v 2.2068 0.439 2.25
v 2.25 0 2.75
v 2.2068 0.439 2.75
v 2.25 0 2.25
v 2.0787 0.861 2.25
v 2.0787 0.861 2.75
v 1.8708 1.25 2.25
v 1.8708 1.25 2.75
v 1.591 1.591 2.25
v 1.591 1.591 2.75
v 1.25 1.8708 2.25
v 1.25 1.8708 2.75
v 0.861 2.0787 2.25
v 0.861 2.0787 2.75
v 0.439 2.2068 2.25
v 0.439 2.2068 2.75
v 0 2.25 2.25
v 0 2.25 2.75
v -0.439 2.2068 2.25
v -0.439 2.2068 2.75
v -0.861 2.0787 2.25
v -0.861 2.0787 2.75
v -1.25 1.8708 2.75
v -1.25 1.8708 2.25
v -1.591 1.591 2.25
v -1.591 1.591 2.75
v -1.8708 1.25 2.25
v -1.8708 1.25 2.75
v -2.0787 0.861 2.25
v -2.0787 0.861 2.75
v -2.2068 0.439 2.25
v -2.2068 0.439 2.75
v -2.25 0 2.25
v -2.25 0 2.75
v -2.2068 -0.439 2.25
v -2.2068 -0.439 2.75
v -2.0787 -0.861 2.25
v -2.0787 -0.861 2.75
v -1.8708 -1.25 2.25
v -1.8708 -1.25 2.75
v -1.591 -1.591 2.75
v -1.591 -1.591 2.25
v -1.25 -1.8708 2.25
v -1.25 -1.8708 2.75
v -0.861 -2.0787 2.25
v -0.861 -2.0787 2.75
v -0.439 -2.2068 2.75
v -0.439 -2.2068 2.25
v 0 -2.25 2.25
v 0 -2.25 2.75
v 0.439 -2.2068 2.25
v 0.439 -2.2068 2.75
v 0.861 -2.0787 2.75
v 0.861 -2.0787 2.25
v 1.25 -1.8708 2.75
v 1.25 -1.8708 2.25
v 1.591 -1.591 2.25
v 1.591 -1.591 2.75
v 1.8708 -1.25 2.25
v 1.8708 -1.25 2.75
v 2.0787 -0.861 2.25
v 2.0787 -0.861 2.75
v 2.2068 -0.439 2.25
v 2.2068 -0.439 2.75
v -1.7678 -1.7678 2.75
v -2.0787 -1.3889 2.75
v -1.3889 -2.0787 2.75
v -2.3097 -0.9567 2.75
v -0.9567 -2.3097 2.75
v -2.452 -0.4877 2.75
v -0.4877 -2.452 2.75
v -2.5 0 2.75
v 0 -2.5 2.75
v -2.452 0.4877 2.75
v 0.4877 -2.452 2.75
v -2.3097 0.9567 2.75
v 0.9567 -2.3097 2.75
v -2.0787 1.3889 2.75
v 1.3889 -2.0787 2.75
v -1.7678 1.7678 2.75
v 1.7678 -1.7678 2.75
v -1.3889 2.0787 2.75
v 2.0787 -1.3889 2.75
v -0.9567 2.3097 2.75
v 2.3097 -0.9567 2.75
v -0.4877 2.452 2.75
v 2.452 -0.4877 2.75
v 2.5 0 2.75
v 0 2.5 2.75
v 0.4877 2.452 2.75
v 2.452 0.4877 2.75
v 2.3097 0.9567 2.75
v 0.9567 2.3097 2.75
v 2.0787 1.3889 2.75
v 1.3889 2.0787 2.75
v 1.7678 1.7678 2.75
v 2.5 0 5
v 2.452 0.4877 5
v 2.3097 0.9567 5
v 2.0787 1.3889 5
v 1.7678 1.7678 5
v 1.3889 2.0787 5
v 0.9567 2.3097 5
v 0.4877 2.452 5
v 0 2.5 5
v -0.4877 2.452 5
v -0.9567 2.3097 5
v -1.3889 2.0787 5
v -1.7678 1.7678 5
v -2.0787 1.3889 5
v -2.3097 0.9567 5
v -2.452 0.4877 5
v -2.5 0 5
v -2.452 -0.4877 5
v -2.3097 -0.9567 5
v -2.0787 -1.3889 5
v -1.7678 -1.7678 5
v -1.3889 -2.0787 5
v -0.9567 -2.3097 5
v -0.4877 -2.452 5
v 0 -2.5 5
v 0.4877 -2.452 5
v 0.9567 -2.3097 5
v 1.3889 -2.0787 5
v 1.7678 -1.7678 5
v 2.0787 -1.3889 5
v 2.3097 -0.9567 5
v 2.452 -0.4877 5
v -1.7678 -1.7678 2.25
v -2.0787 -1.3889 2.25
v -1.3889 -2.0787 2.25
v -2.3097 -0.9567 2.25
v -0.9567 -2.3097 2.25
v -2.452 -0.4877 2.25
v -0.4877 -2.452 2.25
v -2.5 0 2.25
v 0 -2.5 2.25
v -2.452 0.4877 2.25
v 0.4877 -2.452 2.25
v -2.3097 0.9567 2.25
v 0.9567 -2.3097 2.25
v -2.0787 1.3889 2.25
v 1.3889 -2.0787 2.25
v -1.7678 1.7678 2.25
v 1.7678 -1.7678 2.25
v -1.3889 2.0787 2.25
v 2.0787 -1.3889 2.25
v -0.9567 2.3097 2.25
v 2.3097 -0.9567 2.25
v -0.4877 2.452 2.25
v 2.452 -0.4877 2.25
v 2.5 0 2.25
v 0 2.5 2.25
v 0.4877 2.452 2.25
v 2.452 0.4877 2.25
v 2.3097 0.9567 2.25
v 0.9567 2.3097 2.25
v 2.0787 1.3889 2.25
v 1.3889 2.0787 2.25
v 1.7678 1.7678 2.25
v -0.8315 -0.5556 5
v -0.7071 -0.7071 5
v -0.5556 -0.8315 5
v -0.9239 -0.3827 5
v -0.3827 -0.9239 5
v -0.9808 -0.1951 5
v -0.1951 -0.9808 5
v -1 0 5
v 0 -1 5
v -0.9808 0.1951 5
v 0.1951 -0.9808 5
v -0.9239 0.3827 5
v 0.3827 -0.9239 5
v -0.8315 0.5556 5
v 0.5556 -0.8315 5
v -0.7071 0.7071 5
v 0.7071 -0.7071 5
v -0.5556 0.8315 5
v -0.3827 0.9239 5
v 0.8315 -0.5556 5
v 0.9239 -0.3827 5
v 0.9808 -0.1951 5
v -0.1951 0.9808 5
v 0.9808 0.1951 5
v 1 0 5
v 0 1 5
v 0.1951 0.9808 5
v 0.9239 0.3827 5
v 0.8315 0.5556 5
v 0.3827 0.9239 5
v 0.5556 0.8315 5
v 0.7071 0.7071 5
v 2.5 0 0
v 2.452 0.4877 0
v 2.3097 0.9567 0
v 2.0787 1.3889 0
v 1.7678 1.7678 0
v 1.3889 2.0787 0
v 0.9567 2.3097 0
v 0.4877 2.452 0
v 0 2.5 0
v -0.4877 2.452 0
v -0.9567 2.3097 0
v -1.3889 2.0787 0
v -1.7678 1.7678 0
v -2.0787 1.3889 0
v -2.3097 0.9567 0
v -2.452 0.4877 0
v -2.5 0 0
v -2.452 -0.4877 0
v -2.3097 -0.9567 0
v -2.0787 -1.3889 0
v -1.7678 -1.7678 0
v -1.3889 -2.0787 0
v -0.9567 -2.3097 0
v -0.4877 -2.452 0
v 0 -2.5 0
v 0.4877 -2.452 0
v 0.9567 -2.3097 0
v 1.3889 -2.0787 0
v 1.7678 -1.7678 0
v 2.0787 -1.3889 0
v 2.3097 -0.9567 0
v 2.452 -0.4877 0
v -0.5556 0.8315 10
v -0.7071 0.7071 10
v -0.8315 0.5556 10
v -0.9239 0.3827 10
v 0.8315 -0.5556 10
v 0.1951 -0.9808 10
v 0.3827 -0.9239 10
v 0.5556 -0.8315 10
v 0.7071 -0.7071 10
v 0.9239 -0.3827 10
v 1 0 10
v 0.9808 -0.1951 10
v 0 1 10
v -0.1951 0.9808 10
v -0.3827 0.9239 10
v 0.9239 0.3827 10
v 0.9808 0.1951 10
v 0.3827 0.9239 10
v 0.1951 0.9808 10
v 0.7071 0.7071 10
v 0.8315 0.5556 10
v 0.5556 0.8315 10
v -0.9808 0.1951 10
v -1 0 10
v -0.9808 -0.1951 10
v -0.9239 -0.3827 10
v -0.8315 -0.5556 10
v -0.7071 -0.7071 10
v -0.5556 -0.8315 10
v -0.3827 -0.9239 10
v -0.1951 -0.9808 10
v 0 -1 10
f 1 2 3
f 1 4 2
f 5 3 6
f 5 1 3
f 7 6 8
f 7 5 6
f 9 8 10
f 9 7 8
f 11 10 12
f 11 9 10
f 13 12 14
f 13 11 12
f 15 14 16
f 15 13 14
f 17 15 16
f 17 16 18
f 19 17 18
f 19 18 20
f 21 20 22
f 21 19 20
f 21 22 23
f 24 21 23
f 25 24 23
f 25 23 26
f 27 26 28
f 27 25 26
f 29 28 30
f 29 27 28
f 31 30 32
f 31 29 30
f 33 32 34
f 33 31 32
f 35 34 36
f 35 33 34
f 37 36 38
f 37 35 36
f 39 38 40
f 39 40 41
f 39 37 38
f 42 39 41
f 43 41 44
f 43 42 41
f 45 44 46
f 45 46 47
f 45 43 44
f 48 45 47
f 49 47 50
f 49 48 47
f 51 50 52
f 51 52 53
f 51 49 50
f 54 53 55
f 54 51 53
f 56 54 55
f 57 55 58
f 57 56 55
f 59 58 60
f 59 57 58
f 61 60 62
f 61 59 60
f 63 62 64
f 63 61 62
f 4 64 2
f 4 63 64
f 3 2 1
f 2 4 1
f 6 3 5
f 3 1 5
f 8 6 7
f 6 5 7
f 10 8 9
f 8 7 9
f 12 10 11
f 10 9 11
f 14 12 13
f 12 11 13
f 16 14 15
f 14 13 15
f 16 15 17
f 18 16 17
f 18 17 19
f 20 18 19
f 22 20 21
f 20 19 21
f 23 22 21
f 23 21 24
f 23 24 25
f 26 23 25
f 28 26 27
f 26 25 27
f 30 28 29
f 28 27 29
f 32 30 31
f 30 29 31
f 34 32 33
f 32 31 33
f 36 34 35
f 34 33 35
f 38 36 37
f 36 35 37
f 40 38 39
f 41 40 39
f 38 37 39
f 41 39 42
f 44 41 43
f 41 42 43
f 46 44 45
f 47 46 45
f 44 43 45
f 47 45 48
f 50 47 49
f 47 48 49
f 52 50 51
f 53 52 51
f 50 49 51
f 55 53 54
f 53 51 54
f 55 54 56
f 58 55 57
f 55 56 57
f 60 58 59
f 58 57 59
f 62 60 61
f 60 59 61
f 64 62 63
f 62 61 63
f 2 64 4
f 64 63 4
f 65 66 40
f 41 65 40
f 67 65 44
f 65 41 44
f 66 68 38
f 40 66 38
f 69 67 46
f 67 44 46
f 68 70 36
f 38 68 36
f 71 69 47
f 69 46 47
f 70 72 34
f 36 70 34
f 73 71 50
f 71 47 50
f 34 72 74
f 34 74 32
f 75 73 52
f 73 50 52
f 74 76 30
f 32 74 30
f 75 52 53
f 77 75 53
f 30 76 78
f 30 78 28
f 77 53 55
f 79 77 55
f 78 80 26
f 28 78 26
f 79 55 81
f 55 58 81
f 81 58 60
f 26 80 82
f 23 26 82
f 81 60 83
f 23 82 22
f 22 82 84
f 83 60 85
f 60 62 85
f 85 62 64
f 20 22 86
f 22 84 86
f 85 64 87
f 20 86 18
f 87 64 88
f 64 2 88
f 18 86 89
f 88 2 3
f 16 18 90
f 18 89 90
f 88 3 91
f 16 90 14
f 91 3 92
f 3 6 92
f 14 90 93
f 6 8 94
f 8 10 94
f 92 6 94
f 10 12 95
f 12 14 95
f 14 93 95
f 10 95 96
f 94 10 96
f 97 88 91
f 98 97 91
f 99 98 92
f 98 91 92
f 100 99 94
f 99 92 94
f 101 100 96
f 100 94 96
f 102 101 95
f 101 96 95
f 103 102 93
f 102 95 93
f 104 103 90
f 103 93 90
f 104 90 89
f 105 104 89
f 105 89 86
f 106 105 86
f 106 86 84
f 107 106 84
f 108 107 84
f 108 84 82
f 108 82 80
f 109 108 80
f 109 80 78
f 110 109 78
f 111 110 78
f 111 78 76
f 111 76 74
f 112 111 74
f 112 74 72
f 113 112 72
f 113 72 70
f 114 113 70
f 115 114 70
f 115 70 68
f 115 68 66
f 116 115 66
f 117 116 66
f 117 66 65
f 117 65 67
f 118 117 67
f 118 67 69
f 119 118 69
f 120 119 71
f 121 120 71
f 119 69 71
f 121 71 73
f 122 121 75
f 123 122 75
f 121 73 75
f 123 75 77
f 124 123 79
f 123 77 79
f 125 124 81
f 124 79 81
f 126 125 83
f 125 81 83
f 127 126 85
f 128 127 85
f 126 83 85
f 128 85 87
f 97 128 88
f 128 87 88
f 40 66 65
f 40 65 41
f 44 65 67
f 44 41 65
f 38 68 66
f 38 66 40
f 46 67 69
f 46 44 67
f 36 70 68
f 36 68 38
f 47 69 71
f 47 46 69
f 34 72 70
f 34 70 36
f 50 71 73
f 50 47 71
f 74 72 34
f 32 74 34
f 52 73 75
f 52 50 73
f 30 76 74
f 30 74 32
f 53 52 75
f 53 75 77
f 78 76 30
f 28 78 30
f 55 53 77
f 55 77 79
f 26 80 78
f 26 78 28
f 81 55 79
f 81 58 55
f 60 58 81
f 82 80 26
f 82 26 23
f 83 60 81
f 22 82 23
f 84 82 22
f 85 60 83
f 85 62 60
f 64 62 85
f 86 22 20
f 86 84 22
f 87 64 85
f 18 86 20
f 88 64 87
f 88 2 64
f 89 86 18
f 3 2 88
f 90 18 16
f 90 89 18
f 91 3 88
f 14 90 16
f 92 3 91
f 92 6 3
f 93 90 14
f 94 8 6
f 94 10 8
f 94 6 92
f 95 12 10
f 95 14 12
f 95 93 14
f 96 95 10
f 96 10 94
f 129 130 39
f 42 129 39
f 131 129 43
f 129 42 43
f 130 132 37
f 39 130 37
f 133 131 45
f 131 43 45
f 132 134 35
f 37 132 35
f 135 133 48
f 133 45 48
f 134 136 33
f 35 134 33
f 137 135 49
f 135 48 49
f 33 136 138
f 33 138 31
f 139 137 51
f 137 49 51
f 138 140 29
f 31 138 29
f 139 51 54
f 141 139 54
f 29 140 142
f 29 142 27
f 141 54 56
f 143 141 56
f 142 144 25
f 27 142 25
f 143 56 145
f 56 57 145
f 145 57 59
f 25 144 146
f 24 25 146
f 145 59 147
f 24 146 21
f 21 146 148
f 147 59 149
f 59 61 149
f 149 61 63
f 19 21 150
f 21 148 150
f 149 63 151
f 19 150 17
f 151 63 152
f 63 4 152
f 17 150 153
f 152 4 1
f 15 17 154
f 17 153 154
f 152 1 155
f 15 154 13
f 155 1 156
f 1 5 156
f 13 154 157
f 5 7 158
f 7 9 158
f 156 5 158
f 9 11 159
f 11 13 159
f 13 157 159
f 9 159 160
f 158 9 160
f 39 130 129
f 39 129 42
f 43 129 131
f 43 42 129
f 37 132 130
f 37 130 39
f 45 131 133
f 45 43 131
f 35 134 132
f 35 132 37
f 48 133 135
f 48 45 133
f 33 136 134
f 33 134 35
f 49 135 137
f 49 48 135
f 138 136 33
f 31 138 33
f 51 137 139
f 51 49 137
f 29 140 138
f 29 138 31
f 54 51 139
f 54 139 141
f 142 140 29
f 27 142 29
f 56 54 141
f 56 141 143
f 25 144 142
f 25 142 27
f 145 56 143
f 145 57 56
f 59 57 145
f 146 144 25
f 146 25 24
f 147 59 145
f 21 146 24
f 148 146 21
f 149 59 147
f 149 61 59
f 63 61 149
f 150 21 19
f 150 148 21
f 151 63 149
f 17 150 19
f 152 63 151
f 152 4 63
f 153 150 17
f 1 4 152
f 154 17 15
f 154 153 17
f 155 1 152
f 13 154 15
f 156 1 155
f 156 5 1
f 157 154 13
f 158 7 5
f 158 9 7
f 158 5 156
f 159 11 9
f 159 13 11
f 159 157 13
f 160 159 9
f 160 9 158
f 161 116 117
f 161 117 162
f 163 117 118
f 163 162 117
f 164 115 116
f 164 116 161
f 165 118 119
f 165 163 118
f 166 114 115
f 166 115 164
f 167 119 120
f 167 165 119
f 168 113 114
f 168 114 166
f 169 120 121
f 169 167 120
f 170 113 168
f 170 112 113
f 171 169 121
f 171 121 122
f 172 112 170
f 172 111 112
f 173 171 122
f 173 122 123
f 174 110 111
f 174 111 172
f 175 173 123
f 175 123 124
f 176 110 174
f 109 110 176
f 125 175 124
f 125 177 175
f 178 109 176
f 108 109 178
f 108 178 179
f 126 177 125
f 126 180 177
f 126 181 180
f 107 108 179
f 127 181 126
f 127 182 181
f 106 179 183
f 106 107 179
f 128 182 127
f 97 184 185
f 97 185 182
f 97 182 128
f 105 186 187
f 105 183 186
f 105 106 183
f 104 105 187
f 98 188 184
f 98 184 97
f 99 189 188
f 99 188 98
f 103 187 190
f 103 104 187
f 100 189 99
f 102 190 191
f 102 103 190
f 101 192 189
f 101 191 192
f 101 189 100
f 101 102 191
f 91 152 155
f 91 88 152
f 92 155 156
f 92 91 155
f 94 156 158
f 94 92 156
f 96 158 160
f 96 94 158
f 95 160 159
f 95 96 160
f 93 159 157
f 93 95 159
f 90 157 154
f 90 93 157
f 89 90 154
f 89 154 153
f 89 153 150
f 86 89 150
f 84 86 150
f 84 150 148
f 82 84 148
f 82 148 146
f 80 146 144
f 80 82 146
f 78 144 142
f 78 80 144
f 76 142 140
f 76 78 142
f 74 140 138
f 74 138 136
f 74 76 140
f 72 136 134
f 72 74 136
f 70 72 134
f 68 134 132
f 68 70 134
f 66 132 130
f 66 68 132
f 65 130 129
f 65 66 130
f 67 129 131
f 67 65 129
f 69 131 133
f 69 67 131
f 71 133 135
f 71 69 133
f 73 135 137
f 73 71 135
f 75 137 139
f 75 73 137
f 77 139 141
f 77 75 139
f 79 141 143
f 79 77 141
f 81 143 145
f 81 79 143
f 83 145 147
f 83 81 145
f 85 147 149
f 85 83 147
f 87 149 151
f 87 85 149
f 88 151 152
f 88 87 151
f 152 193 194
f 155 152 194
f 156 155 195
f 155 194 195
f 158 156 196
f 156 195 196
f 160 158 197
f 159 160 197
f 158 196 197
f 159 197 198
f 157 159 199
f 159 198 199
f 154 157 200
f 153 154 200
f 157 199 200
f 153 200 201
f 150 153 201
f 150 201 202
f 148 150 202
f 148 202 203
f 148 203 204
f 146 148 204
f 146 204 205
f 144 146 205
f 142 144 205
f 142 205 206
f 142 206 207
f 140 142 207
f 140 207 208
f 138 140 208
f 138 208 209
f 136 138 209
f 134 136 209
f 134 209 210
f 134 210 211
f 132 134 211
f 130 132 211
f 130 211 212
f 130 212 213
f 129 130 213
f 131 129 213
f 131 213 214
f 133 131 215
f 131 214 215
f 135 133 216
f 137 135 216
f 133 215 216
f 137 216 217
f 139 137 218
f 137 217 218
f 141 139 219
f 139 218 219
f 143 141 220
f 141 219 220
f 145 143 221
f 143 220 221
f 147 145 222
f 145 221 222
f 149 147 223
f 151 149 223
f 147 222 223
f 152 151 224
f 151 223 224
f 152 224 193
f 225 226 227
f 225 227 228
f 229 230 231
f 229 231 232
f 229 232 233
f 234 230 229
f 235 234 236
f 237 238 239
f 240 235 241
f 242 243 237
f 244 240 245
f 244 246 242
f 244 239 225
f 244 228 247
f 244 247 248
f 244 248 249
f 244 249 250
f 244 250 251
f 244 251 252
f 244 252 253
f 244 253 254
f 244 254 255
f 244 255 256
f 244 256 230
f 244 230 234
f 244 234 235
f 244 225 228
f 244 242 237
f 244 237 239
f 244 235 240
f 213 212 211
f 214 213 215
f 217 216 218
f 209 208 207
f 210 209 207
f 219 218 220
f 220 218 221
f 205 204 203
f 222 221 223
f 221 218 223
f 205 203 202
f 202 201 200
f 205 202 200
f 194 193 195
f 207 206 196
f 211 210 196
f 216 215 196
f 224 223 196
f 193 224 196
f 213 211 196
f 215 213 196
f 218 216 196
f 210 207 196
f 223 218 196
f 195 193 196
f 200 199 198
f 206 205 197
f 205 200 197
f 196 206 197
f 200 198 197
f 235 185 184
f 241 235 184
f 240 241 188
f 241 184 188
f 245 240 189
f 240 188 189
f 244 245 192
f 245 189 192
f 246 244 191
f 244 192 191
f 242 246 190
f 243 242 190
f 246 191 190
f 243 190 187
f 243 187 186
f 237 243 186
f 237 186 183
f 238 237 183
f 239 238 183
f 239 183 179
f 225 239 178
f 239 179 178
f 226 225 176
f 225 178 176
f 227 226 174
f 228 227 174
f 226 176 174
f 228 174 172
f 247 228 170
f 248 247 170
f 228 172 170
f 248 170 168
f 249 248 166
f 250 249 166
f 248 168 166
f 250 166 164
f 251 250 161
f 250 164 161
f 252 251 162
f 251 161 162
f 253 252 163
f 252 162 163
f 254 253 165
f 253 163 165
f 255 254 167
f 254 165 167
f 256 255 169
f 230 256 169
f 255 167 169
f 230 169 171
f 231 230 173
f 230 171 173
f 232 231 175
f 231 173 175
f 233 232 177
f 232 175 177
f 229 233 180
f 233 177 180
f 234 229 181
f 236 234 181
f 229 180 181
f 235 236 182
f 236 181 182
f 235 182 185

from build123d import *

# Parameters (mm, degrees)
F0_R     = 2.5
F1_DEPTH = 5
F3_R     = 1
F4_DEPTH = 5
F5_R     = 2.5
F5_R_2   = 2.25
F6_DEPTH = 0.25
F7_DEPTH = 0.25


with BuildPart() as f1:
    # F0 (on Top) → F1 (new body)
    with BuildSketch(Plane.XY):
        Circle(F0_R)
    extrude(amount=F1_DEPTH)

    # F3 (on face) → F4 (join)
    with BuildSketch(Plane.XY.offset(5)):
        Circle(F3_R)
    extrude(amount=F4_DEPTH)

    # F5 (on offset) → F6 (cut, symmetric)
    with BuildSketch(Plane.XY.offset(2.5)):
        Circle(F5_R)
        Circle(F5_R_2, mode=Mode.SUBTRACT)
    extrude(amount=F6_DEPTH, both=True, mode=Mode.SUBTRACT)


with BuildPart() as f7:
    # F5 (on offset) → F7 (new body, symmetric)
    with BuildSketch(Plane.XY.offset(2.5)):
        Circle(F5_R)
        Circle(F5_R_2, mode=Mode.SUBTRACT)
    extrude(amount=F7_DEPTH, both=True)


solid = Compound([f1.part, f7.part])
